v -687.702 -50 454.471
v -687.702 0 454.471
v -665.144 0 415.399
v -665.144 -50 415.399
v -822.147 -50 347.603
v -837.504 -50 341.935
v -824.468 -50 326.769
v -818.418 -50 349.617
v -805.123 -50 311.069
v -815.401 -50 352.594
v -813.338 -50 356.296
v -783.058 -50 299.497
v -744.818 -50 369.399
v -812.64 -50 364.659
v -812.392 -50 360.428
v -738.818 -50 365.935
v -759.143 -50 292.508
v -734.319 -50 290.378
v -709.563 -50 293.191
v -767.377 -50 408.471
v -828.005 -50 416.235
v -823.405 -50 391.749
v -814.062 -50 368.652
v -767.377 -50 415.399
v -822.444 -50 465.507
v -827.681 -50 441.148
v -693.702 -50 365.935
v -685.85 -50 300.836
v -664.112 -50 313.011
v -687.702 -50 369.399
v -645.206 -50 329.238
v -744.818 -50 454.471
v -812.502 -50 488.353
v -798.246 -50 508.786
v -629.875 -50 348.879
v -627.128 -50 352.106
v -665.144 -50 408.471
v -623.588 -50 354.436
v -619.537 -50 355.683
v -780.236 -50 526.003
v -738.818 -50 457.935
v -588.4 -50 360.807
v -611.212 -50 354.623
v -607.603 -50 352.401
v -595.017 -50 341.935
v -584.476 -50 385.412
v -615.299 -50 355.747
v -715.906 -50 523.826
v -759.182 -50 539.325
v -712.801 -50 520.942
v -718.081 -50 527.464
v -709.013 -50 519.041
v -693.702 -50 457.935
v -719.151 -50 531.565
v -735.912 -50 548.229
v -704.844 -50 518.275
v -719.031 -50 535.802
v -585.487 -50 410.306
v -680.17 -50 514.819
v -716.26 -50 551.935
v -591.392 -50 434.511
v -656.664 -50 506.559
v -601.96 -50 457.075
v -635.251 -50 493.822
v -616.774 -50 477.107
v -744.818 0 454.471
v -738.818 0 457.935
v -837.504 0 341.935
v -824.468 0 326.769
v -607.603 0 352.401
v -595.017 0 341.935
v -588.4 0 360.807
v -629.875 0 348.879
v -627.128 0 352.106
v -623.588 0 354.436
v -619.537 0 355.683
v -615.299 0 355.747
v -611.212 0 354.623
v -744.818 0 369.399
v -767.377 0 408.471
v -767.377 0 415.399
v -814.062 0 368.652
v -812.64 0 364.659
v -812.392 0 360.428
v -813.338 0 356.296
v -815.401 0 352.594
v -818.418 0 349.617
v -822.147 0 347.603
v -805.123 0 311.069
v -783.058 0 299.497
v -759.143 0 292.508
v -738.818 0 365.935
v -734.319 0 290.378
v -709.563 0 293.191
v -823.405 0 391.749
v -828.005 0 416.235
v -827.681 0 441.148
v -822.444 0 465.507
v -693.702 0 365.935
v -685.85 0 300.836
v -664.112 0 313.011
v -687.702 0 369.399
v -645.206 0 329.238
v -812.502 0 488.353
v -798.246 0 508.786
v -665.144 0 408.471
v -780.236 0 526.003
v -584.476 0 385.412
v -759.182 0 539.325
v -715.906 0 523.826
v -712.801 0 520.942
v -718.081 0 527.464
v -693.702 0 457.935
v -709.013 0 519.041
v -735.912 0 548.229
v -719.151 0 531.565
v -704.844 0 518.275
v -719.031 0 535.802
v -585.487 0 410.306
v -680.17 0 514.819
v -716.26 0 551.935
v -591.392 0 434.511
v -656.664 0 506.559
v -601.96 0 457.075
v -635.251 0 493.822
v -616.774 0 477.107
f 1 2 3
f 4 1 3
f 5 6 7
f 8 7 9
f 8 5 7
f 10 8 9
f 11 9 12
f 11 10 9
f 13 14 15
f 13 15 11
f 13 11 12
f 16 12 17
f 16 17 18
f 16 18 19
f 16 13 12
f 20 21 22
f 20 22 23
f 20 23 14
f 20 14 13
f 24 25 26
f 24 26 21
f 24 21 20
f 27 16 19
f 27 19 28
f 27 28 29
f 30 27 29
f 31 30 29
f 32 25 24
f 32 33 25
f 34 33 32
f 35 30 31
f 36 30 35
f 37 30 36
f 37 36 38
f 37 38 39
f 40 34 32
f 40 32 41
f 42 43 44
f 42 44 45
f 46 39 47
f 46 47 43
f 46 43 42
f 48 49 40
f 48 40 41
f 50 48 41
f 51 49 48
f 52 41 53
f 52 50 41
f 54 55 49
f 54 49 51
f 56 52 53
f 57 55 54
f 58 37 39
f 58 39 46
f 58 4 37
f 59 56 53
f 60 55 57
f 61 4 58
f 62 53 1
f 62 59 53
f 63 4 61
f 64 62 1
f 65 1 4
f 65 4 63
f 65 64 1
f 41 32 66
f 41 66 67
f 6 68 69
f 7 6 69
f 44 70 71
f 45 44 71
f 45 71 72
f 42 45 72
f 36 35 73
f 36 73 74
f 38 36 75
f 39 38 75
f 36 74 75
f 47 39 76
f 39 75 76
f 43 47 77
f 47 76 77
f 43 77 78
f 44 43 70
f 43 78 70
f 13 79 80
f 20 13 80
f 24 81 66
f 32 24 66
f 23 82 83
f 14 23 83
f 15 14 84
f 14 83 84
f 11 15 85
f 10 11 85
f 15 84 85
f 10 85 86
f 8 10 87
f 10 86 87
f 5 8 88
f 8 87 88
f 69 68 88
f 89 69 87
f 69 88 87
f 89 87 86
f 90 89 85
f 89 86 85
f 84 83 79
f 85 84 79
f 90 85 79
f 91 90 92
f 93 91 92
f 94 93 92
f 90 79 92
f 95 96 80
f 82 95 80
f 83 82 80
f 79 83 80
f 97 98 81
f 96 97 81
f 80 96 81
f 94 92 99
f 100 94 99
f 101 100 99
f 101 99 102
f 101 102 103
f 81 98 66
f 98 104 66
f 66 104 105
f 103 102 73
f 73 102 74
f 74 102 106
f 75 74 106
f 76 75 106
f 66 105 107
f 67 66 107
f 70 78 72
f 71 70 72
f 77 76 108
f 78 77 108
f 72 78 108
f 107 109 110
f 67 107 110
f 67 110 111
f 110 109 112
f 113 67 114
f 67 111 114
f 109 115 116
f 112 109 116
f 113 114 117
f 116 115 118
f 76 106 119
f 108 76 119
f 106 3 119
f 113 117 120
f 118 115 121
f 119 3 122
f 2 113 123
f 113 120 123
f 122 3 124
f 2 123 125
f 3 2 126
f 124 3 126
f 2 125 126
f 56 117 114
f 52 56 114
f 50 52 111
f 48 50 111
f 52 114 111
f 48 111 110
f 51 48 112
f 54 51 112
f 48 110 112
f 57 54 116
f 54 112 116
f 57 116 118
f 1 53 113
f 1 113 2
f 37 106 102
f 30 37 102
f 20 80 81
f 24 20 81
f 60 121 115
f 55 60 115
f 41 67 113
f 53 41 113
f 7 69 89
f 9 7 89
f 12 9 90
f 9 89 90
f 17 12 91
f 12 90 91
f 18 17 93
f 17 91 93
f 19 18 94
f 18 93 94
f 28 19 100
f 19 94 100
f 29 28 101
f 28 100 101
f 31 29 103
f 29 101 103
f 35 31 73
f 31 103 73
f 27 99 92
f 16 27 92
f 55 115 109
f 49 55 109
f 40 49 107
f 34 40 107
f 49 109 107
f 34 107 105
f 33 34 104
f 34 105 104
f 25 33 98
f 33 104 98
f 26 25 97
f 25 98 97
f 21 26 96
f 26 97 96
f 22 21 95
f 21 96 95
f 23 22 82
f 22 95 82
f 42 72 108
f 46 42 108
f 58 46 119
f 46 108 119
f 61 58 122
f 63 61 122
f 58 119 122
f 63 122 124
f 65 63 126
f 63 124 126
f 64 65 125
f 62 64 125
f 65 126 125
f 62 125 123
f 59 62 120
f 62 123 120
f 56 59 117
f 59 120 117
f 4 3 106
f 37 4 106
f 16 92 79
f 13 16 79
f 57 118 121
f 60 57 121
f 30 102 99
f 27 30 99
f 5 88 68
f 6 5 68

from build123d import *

# Parameters (mm, degrees)
F1_DEPTH = 50


# Not quite as in the source:
# - ends of sketch curves that miss each other by under 0.0002 mm in the source are joined


with BuildPart() as f1:
    # F0 (on Front) → F1 (new body)
    with BuildSketch(Plane.XZ):
        with BuildLine():
            Line((-719.030741, 535.802017), (-716.260339, 551.935195))
            Line((-716.260339, 551.935195), (-735.912365, 548.229318))
            ThreePointArc((-735.912365, 548.229318), (-818.0414227516, 477.1771162339), (-814.0615494377, 368.65173577))
            ThreePointArc((-814.0615494377, 368.65173577), (-813.3377138775, 356.2962207865), (-822.1469540915, 347.602546248))
            Line((-822.1469540915, 347.602546248), (-837.503896, 341.935195))
            Line((-837.503896, 341.935195), (-824.468499, 326.76898))
            ThreePointArc((-824.468499, 326.76898), (-721.8709589722, 291.1692315288), (-629.8751597113, 348.8785918176))
            ThreePointArc((-629.8751597113, 348.8785918176), (-619.5368877345, 355.6832101227), (-607.6033241523, 352.4010218168))
            Line((-607.6033241523, 352.4010218168), (-595.016783, 341.935195))
            Line((-595.016783, 341.935195), (-588.400154, 360.807287))
            ThreePointArc((-588.400154, 360.807287), (-608.868637199, 467.4592376194), (-704.8443090013, 518.2752569674))
            ThreePointArc((-704.8443090013, 518.2752569674), (-715.9064175677, 523.8261534239), (-719.030741, 535.802017))
        make_face()
        Polygon((-767.376564, 415.399297), (-744.818452, 454.471094), (-738.818452, 457.935195), (-693.702227, 457.935195), (-687.702227, 454.471094), (-665.144115, 415.399297), (-665.144115, 408.471094), (-687.702227, 369.399297), (-693.702227, 365.935195), (-738.818452, 365.935195), (-744.818452, 369.399297), (-767.376564, 408.471094), align=None, mode=Mode.SUBTRACT)
    extrude(amount=F1_DEPTH)


solid = f1.part
